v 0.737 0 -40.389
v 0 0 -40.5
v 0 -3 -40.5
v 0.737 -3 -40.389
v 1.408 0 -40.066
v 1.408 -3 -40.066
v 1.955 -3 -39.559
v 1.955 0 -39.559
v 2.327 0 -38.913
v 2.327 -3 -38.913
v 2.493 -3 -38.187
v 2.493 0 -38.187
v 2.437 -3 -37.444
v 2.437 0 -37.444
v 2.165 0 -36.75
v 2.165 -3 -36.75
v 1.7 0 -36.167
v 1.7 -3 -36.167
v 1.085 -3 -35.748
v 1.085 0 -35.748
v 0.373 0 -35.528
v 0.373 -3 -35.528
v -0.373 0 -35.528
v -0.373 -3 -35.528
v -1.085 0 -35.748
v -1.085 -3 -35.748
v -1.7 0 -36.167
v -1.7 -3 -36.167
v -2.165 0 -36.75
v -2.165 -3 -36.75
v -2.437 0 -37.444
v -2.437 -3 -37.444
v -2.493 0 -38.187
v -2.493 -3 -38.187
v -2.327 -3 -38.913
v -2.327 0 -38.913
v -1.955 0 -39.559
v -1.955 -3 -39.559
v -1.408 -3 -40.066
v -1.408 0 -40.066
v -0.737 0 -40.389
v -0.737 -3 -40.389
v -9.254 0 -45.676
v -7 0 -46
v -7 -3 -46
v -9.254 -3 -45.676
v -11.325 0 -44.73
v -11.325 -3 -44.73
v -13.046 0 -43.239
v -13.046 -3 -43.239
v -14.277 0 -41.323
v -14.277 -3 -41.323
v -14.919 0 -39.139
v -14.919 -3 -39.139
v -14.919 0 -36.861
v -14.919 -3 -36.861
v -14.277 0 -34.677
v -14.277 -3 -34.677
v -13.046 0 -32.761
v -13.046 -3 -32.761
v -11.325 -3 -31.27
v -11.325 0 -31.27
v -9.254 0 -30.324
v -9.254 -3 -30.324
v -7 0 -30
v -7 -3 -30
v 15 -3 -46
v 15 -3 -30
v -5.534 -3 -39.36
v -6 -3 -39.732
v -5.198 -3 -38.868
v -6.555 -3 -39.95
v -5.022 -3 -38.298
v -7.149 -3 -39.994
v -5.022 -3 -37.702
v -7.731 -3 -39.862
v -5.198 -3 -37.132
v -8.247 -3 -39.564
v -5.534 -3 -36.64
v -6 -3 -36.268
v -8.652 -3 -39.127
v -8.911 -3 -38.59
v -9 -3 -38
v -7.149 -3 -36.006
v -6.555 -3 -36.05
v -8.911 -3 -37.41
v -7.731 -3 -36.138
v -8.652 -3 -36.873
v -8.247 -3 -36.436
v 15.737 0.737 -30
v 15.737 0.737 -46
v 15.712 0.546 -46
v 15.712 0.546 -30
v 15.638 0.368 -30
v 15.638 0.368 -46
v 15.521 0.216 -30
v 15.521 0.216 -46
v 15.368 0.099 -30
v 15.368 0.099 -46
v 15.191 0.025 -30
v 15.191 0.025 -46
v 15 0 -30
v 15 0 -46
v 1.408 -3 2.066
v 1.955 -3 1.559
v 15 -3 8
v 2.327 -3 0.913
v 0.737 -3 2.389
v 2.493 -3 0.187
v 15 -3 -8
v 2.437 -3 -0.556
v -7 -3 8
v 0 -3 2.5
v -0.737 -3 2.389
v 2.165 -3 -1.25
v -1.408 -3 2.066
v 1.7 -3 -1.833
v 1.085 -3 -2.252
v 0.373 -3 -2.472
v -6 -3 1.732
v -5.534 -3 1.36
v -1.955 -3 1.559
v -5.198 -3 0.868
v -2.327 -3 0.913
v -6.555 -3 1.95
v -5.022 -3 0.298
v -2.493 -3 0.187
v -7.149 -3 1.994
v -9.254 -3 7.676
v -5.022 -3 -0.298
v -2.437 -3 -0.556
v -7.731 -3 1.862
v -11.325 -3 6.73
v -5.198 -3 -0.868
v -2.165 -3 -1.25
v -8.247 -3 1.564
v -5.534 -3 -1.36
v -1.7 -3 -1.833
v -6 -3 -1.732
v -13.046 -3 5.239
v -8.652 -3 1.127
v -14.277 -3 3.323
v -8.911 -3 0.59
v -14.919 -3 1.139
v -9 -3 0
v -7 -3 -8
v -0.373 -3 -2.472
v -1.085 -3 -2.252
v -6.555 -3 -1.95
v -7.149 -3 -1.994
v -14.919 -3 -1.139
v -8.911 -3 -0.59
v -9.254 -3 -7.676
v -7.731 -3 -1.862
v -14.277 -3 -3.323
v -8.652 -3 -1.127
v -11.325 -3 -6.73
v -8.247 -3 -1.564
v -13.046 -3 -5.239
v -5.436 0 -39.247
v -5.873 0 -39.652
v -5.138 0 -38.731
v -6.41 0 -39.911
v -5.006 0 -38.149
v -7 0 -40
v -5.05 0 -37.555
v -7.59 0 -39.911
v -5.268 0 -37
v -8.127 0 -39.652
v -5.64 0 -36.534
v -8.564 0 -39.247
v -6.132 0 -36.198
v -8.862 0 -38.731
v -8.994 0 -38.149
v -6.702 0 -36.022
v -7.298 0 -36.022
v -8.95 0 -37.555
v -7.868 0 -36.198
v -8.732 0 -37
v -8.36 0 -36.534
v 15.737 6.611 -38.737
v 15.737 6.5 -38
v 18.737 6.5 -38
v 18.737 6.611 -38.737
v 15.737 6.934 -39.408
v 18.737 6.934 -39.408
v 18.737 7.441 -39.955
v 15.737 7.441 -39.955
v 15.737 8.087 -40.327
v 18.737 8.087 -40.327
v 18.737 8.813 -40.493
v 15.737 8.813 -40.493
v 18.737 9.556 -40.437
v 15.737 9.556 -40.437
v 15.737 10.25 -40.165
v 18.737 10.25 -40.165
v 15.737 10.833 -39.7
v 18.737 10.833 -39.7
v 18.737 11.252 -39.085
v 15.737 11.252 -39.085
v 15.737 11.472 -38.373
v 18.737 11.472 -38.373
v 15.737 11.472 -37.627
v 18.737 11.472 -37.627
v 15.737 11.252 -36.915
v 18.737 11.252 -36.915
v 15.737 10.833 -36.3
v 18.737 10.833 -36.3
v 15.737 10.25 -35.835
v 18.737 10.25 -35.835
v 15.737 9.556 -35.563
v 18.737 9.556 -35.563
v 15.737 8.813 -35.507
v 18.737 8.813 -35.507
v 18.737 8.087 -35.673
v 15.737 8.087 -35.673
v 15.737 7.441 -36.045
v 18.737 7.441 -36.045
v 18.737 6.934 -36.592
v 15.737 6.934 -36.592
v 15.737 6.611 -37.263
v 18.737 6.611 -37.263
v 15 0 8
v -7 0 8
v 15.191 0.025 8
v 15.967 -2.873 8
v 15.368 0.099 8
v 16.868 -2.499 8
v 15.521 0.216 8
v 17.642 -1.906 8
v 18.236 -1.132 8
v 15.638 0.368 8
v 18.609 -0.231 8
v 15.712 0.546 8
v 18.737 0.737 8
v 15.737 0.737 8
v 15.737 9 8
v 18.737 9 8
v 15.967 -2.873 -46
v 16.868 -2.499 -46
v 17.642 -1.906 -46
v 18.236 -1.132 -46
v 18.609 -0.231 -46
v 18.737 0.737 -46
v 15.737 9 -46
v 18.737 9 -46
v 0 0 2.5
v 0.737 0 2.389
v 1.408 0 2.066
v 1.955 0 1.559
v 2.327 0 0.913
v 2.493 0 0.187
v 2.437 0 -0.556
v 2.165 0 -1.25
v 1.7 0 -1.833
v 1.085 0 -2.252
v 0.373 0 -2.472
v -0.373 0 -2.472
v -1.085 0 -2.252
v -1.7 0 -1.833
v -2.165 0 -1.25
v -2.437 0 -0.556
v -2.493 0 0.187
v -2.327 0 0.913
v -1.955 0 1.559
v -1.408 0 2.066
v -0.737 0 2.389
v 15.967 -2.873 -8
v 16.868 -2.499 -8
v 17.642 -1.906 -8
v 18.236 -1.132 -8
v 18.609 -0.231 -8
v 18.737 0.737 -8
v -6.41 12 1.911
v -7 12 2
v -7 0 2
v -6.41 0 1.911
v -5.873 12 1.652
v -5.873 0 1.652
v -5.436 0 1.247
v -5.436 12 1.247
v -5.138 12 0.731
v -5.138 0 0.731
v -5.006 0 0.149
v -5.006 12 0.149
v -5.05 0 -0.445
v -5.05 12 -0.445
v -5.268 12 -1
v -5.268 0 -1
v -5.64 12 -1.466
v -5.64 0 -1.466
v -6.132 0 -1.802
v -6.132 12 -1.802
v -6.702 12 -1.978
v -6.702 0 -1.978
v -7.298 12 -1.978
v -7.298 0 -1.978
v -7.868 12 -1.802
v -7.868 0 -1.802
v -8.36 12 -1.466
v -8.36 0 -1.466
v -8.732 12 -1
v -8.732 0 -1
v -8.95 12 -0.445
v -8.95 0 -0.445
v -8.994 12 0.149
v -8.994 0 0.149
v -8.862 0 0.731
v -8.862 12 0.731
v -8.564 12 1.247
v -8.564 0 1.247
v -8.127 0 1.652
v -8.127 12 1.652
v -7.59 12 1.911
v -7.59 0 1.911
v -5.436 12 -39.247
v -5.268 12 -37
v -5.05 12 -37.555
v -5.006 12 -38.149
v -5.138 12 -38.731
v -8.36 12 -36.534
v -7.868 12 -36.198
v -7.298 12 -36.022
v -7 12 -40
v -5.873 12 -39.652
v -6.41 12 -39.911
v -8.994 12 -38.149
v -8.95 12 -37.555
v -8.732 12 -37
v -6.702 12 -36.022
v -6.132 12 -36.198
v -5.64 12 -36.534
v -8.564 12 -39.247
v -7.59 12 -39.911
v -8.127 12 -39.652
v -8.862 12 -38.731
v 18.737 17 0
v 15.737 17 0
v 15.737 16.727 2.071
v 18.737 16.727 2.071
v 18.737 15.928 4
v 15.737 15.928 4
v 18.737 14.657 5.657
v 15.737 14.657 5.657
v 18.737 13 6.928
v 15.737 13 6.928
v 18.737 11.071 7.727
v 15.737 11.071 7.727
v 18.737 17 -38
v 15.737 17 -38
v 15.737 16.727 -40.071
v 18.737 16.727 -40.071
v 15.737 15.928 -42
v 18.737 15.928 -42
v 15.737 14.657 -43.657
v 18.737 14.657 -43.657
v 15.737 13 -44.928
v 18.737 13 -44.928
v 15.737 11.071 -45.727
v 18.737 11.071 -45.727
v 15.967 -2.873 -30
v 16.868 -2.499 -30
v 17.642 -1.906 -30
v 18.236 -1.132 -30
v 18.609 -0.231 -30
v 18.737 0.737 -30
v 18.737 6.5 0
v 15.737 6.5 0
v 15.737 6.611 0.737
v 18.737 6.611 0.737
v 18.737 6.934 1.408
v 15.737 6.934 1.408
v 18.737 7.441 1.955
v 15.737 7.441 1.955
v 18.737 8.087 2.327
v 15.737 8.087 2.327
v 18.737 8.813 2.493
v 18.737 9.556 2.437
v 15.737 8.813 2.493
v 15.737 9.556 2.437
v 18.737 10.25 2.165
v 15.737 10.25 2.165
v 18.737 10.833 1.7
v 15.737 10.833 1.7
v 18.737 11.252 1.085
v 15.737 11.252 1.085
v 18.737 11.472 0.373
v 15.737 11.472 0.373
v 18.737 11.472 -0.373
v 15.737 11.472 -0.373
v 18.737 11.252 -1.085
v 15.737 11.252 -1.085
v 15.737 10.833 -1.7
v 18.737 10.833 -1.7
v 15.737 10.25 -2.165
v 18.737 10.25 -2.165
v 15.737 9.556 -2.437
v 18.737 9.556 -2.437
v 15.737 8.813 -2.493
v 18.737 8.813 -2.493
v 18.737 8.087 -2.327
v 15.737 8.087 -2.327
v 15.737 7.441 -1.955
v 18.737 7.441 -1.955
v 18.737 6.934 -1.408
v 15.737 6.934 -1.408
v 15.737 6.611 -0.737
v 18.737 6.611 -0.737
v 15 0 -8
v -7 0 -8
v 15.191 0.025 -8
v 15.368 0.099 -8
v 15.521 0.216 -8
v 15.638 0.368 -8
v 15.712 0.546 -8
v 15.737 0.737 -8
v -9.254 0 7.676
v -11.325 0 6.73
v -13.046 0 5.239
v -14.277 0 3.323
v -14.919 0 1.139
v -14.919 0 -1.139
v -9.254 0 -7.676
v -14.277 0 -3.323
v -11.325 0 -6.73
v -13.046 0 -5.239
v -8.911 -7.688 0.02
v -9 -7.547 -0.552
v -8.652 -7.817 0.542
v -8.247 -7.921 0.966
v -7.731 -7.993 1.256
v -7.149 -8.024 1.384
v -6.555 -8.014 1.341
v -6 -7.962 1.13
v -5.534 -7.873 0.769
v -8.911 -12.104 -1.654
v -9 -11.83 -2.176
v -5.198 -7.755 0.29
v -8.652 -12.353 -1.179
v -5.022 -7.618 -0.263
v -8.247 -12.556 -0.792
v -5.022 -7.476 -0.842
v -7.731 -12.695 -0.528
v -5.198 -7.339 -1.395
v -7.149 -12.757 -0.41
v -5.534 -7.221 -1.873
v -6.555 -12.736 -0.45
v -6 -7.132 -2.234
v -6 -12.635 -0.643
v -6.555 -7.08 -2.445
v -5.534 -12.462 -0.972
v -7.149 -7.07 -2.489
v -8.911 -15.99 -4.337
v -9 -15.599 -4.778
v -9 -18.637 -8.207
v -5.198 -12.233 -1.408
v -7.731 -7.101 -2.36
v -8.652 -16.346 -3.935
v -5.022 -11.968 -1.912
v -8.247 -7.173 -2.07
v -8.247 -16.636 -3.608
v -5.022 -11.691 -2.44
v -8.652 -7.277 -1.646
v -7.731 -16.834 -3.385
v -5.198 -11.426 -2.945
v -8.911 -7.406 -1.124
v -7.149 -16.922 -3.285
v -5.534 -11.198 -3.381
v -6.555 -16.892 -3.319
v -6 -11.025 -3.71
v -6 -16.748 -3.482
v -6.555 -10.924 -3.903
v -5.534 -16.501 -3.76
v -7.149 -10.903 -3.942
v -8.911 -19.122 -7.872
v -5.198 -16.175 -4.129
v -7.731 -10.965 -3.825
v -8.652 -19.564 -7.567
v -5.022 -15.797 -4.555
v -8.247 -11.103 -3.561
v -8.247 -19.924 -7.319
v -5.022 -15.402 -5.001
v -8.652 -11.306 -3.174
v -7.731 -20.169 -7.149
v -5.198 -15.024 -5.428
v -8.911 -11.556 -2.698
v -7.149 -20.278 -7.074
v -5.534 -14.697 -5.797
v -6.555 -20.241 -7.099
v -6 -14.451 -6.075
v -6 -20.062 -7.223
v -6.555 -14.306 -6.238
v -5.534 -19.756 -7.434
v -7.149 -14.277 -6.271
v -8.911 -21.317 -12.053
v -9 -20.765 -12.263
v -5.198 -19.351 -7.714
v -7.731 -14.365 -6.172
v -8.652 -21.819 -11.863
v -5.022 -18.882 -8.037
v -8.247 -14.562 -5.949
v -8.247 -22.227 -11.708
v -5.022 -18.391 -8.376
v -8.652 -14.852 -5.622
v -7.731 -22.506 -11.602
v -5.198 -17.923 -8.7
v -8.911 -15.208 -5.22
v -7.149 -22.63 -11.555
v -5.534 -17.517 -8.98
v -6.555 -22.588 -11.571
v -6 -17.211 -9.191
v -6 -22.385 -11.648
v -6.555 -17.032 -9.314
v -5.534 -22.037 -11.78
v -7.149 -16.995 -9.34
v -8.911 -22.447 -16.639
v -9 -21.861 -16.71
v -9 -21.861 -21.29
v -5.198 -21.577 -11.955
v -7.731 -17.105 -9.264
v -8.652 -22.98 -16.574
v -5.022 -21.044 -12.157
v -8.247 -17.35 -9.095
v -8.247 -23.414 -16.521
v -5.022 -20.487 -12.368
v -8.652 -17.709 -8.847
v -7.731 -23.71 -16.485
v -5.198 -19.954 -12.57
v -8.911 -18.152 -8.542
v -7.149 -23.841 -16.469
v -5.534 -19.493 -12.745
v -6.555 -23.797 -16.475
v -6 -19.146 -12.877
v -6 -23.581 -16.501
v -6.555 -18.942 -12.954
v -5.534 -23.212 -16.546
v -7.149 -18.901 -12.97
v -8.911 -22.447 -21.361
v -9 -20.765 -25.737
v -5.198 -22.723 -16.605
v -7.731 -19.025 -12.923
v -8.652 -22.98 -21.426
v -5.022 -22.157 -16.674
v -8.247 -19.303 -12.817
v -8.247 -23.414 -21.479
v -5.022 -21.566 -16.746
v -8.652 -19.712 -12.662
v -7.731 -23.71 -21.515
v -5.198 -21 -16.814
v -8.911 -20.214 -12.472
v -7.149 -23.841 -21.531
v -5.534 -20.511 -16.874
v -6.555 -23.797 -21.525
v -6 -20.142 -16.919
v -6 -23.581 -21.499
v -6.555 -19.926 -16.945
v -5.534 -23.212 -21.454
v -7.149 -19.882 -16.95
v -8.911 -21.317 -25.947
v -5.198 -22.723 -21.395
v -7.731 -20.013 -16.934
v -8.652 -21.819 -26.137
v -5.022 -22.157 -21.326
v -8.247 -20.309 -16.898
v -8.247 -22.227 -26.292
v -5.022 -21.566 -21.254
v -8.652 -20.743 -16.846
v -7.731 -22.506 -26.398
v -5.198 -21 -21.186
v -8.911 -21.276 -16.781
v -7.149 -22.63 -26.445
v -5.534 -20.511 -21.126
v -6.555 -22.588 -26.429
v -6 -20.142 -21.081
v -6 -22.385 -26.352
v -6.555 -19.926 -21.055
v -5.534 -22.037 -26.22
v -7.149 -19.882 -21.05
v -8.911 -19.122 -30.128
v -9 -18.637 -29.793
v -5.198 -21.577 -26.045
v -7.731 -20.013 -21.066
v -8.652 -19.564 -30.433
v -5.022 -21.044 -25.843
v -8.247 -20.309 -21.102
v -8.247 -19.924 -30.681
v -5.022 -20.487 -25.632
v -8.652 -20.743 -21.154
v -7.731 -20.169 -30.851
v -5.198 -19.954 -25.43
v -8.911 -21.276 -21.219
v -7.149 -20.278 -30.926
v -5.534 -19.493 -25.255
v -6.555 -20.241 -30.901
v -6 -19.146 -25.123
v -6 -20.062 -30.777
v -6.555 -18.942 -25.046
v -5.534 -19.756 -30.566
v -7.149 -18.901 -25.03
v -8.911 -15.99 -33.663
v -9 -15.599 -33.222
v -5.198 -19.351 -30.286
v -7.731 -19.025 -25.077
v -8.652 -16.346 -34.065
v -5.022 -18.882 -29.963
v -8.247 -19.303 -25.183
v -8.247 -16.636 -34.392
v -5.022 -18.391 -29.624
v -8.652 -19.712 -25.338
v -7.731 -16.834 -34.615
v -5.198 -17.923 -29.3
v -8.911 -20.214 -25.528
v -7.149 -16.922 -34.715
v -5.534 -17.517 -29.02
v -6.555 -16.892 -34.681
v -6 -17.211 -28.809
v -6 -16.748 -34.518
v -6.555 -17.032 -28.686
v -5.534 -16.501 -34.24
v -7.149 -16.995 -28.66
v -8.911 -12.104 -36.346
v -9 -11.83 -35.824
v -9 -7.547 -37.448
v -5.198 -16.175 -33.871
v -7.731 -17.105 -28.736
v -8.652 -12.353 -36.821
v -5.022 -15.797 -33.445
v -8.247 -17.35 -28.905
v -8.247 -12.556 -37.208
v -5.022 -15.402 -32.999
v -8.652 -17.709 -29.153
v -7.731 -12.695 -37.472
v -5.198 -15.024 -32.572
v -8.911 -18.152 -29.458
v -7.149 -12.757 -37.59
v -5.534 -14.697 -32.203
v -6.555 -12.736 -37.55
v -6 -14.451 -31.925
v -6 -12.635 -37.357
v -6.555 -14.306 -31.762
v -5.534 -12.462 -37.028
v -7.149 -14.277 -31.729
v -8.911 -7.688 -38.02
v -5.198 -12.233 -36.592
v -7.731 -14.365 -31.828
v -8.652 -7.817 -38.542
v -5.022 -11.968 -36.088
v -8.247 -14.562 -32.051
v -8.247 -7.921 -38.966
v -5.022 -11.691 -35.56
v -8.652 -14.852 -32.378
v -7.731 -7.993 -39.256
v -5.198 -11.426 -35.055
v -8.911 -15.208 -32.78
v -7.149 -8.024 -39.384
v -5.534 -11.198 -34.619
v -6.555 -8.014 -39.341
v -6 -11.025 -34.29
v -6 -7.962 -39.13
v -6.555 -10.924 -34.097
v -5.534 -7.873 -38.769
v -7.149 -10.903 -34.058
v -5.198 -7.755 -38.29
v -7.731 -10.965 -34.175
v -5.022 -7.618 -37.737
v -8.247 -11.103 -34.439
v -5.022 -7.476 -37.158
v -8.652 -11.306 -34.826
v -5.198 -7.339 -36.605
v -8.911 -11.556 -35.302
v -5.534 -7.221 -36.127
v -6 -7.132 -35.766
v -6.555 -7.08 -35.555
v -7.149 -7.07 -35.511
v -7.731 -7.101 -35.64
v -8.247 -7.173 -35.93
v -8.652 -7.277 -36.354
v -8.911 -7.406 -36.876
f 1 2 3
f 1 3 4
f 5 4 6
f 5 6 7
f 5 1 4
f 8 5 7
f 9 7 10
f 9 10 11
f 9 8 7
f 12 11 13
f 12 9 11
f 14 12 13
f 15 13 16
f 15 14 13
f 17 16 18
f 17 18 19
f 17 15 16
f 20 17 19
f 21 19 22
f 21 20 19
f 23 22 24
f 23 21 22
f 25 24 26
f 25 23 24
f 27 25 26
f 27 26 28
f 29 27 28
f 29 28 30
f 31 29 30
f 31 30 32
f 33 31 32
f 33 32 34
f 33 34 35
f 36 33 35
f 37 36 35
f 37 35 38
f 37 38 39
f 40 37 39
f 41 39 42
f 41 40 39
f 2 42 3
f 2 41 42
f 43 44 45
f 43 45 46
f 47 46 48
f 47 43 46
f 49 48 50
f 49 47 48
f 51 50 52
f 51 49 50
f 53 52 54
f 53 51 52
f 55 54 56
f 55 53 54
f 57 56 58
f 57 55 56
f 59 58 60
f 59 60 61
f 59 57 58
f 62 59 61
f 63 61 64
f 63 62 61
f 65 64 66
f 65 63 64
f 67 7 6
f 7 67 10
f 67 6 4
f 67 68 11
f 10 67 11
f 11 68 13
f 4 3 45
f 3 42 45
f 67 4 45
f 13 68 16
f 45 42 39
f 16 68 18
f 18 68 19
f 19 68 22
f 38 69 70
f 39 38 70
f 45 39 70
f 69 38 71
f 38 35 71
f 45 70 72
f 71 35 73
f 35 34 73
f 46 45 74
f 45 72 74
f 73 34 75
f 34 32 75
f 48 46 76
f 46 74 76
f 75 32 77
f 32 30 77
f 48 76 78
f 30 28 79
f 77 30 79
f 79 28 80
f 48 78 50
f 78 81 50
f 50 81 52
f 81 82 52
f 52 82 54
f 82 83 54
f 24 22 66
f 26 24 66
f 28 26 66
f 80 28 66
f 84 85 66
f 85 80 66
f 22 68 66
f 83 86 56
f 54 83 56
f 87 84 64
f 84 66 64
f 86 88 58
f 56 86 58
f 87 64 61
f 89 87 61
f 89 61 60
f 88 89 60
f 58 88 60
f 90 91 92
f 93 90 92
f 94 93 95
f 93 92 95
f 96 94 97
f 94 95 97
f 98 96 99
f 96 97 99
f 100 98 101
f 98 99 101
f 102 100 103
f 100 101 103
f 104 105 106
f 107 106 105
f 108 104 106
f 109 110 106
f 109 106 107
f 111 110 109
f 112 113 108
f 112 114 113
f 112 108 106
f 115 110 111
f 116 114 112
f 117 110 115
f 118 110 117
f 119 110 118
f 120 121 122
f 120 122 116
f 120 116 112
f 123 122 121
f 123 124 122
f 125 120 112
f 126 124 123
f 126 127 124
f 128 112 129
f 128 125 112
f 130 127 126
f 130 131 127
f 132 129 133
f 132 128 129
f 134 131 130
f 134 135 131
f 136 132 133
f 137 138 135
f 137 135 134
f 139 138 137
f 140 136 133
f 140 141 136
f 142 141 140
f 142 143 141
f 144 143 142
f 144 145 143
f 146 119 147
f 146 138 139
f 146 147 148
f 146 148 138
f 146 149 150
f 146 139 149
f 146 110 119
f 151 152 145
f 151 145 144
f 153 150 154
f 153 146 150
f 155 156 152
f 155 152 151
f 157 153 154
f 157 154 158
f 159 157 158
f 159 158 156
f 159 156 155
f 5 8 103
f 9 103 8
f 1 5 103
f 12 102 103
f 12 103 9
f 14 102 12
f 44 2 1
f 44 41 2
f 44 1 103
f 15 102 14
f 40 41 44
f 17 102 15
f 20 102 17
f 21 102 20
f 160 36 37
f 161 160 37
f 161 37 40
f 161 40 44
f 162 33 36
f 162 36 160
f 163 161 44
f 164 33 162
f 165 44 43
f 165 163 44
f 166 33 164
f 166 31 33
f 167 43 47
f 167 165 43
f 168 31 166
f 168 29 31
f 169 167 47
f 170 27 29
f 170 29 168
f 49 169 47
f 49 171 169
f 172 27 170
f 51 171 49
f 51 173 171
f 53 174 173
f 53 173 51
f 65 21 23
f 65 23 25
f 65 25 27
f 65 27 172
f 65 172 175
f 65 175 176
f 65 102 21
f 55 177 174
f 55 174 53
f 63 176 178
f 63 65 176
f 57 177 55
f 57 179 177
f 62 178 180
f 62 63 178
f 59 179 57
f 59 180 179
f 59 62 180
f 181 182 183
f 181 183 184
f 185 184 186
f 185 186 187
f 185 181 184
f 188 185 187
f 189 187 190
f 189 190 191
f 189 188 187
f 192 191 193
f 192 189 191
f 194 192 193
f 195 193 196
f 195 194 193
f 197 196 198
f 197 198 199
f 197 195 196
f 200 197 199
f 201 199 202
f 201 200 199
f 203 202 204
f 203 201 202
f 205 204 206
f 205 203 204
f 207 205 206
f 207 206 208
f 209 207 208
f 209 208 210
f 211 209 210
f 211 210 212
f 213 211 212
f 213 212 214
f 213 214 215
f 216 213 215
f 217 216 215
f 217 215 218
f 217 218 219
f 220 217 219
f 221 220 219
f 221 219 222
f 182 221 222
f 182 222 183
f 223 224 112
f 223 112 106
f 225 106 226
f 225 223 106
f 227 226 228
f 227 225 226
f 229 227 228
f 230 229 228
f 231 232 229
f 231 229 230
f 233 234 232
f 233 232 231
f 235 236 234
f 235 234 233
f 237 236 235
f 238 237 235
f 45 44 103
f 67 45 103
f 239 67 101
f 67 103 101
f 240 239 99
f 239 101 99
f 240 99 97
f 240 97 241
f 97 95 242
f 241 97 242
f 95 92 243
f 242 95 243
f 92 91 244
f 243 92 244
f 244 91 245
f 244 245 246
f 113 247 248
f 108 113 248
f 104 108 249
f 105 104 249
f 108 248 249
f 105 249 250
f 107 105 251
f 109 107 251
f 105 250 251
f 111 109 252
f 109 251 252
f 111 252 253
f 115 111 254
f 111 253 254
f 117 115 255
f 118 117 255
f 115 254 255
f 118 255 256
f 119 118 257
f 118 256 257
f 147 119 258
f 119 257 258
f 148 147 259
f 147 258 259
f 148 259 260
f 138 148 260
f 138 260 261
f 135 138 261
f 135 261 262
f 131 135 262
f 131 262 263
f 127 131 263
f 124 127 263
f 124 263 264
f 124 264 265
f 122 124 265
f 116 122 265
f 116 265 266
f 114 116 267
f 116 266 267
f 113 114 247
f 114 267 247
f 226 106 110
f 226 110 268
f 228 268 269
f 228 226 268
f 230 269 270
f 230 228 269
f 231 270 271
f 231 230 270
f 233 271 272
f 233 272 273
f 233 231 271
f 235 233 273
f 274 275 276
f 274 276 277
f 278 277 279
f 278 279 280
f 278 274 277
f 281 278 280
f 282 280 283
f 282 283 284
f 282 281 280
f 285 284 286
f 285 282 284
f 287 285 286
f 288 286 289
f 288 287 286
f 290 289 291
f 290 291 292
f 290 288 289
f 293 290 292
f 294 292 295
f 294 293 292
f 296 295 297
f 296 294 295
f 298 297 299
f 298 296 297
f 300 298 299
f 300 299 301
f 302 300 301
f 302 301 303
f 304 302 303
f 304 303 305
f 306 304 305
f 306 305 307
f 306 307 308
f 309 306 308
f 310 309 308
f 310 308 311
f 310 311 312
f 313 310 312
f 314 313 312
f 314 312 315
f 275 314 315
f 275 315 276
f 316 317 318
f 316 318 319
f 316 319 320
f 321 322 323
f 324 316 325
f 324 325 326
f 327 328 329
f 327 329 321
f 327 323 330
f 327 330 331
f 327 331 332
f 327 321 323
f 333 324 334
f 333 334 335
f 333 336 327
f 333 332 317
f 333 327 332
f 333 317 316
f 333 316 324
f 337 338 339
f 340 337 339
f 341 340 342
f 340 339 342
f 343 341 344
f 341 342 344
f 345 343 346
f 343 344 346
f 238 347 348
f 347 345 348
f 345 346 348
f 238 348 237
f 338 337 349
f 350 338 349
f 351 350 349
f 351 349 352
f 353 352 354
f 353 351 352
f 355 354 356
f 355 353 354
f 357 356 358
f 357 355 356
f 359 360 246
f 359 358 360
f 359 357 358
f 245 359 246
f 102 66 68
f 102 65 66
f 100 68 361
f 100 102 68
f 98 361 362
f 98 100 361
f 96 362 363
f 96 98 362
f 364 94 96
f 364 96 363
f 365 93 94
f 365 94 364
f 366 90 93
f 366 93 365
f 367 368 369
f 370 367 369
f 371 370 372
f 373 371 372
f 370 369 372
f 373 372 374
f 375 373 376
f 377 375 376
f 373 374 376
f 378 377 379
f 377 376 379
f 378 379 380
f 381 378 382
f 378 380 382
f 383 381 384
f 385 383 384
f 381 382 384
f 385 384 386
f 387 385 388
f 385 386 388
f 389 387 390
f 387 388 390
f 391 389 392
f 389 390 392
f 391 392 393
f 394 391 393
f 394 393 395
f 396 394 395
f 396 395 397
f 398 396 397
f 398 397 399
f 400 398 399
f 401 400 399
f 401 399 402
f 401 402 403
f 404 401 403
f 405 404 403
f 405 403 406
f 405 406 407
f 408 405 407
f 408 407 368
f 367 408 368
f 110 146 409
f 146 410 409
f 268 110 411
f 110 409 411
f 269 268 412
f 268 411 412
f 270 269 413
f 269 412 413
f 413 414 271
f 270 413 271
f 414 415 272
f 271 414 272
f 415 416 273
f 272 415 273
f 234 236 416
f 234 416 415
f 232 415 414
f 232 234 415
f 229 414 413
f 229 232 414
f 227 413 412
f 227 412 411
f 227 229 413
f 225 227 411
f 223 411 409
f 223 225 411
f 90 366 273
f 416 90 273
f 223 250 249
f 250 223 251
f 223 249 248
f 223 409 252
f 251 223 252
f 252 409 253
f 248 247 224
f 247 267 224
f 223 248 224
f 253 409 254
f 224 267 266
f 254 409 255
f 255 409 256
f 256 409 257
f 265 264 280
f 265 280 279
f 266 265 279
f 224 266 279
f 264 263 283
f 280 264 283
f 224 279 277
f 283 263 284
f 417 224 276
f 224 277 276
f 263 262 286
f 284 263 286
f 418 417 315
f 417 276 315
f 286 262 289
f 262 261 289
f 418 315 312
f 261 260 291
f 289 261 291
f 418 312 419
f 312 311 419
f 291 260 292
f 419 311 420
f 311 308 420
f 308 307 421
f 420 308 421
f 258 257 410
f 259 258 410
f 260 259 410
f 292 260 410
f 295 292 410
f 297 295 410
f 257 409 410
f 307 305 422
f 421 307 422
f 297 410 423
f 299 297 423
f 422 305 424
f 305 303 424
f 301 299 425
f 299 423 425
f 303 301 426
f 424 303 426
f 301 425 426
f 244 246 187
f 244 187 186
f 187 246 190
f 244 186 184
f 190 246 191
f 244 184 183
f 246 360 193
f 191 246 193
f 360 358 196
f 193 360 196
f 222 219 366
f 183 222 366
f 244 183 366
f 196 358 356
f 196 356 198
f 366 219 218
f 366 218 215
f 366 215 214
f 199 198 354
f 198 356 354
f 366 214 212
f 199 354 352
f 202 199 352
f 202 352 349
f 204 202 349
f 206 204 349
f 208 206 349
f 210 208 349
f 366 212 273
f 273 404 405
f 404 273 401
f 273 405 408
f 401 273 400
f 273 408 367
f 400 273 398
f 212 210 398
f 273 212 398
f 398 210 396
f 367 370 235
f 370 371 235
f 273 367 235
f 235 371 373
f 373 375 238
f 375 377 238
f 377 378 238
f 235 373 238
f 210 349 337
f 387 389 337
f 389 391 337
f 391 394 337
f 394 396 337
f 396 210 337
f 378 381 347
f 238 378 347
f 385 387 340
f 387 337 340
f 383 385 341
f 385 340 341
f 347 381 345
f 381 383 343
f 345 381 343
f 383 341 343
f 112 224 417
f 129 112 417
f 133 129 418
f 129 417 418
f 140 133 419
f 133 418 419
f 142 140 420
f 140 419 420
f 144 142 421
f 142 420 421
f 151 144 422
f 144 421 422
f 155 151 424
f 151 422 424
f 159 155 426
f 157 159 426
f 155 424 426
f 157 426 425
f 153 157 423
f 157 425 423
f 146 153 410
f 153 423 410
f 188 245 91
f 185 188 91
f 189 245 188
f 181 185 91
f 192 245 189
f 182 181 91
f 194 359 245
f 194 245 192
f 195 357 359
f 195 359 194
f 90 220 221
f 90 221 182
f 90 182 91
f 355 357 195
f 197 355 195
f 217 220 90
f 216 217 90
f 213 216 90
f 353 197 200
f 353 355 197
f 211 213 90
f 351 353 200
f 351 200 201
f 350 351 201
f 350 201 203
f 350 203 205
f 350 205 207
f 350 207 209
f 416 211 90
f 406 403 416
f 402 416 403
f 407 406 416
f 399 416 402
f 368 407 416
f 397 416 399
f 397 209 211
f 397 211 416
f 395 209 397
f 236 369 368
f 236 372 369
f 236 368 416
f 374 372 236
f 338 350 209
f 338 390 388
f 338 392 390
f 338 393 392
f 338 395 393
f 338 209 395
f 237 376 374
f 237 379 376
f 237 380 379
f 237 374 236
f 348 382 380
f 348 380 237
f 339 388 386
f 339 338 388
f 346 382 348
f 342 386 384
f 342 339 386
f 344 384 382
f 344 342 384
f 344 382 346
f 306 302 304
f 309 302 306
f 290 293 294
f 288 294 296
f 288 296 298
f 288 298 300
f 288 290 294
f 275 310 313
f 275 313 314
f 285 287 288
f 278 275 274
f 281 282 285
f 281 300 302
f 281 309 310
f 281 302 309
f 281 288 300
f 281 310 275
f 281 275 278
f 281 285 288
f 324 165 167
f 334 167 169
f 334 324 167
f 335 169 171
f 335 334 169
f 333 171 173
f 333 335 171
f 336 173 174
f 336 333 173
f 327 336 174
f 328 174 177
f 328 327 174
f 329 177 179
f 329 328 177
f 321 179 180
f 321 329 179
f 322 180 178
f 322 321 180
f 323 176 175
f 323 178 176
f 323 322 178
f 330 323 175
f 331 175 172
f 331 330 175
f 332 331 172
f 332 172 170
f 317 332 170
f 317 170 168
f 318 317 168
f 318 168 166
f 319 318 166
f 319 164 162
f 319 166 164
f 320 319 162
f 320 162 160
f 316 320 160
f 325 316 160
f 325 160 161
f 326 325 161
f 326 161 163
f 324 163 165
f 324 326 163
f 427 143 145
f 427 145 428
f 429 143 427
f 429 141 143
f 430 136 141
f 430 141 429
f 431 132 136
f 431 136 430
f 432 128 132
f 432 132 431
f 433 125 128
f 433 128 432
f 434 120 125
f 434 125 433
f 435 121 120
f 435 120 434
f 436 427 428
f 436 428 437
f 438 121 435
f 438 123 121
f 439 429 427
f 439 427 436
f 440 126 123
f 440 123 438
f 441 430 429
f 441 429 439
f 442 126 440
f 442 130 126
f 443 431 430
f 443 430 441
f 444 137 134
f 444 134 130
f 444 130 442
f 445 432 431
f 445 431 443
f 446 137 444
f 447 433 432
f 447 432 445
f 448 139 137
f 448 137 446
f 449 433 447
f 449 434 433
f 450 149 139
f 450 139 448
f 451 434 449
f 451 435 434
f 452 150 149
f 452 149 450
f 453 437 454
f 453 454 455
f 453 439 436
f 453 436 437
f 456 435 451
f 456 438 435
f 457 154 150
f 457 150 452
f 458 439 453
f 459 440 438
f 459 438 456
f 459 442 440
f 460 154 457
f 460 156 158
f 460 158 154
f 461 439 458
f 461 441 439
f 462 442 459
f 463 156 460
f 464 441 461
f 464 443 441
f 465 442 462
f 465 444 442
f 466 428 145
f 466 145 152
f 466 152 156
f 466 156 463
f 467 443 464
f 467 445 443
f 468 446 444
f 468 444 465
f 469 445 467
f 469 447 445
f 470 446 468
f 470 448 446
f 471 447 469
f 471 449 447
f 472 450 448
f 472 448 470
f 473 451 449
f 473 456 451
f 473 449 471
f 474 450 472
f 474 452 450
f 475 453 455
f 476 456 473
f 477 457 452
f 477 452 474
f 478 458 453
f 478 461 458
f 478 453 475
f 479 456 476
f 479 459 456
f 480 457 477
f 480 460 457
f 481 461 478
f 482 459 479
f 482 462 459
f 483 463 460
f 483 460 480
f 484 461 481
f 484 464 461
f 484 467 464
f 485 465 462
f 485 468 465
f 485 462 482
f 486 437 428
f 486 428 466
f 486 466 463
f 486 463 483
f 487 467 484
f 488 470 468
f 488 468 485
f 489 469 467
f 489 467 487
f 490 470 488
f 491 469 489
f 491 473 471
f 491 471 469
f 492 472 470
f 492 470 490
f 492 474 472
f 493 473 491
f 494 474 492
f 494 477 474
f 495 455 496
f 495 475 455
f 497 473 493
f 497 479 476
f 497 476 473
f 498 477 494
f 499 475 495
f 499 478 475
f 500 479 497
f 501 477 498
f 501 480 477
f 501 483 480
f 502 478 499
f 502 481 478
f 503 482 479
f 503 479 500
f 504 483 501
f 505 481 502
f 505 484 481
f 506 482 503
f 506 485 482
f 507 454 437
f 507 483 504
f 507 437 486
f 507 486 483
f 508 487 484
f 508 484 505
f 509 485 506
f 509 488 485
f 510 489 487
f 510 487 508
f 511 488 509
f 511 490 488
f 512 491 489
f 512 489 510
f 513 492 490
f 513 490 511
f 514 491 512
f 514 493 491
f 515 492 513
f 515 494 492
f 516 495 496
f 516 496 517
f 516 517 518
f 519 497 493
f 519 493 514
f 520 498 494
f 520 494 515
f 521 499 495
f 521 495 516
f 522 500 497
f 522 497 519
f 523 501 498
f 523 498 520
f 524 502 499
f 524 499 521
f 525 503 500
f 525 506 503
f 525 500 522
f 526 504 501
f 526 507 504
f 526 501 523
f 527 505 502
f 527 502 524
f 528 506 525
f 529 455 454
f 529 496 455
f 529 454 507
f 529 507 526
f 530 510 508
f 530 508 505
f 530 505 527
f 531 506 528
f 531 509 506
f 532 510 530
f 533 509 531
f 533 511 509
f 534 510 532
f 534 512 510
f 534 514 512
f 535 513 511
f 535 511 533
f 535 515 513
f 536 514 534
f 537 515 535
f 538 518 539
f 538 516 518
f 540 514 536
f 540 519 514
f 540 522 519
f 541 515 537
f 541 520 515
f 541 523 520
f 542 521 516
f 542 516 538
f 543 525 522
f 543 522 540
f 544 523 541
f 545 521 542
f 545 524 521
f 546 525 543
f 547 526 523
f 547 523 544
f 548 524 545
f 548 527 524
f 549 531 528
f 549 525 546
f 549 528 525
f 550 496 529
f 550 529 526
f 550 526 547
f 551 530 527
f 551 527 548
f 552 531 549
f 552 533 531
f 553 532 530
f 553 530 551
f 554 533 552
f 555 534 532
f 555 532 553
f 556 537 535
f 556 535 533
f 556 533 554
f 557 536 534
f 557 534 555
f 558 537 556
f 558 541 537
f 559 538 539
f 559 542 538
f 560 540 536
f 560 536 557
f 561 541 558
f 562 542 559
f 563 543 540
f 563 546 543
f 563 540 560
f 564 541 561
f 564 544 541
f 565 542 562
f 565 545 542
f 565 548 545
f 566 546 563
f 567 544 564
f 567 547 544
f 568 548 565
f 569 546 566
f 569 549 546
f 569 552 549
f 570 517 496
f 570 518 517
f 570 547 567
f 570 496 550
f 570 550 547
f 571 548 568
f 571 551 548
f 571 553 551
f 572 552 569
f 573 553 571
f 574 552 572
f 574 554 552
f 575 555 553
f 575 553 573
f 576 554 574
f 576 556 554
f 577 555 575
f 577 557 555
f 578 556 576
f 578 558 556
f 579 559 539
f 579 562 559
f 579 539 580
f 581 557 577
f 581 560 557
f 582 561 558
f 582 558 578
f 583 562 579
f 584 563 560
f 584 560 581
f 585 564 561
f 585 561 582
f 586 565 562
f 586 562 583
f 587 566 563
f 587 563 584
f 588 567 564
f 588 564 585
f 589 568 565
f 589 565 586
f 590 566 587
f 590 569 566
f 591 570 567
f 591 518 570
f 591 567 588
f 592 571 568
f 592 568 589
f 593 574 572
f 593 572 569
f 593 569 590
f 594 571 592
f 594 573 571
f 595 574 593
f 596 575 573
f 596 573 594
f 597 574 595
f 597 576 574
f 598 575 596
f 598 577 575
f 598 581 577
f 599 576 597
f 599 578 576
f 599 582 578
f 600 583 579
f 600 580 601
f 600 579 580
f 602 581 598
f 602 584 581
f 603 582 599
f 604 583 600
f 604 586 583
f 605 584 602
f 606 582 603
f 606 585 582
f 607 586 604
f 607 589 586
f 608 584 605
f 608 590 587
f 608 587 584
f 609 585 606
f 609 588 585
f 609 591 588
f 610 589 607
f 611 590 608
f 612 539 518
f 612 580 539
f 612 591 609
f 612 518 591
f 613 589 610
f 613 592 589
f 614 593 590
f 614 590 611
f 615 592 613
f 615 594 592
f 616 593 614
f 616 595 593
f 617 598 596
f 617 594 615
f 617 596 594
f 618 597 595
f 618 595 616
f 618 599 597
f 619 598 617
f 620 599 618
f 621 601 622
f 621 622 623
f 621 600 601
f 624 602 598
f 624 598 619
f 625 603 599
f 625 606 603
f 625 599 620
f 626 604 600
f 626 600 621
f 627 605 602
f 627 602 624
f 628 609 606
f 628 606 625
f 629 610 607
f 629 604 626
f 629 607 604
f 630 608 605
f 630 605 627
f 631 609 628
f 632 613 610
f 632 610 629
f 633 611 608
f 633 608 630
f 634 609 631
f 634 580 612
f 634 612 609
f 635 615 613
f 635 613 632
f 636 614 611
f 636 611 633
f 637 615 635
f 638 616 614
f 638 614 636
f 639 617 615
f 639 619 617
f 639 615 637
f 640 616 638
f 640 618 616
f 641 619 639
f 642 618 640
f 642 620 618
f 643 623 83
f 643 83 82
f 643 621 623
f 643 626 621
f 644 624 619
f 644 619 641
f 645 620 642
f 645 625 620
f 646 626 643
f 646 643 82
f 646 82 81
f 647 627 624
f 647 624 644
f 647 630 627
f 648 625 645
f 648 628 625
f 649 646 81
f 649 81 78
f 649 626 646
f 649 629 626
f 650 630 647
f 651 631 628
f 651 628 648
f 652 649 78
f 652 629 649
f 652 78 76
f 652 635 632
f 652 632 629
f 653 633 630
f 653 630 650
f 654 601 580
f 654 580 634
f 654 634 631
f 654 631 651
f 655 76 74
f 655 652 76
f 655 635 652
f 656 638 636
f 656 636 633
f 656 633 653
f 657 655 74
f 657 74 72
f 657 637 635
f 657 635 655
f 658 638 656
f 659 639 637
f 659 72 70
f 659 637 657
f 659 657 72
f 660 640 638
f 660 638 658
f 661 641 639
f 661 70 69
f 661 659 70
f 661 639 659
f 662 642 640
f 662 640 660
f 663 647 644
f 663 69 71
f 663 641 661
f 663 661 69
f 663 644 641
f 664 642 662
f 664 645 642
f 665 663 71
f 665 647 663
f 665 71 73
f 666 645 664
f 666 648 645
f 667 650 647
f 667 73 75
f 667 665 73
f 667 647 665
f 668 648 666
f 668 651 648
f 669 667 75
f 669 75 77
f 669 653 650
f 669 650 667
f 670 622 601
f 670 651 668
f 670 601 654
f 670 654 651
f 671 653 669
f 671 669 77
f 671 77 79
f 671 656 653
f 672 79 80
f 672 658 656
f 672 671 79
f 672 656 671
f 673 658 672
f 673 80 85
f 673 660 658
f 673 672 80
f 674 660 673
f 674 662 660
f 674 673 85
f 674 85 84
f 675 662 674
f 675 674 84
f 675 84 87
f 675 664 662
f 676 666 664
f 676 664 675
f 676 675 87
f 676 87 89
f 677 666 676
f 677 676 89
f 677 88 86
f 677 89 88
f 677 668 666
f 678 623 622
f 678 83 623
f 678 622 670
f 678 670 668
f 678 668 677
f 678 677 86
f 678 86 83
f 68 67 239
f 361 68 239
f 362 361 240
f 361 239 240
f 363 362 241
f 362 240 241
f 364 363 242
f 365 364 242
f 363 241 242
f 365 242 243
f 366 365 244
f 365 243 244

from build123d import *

# Parameters (mm, degrees)
SKETCH1_R           = 2.5
SKETCH1_R_2         = 2
BASE_FLANGE1_DEPTH  = 3
EDGE_FLANGE1_DEPTH  = 16
SKETCH10_R          = 2.5
CUT_EXTRUDE1_DEPTH  = 10
TAB1_START          = -3
TAB1_DEPTH          = 3
SWEEP1_PROFILE_R    = 2
BOSS_EXTRUDE1_START = 15
SKETCH35_R          = 2
BOSS_EXTRUDE1_DEPTH = 15


# Read off the part's stored shape, not the designer's step: Tab1
# Sheet-metal steps are written as plain solids
with BuildPart() as part:
    # Sketch1 → Base-Flange1 (new body)
    with BuildSketch(Plane(origin=(0, 0, 0), x_dir=(1, 0, 0), z_dir=(0, 1, 0))):
        with BuildLine():
            Line((0, -8), (-7, -8))
            ThreePointArc((-7, -8), (-15, 0), (-7, 8))
            Line((-7, 8), (0, 8))
            Line((0, 8), (15, 8))
            Line((15, 8), (15, -8))
            Line((15, -8), (0, -8))
        make_face()
        with Locations(Location((0, 0, 0), (0, 0, 270))):
            Circle(SKETCH1_R, mode=Mode.SUBTRACT)
        with Locations(Location((-7, 0, 0), (0, 0, 270))):
            Circle(SKETCH1_R_2, mode=Mode.SUBTRACT)
    extrude(amount=-BASE_FLANGE1_DEPTH)

    # Edge-Flange1 section (across the edge) → Edge-Flange1 (add)
    with BuildSketch(Plane(origin=(15.7366, 0, 8), x_dir=(-1, 0, 0), z_dir=(0, 0, -1))):
        with BuildLine():
            Line((-3, 0.7366), (-3, 17))
            Line((-3, 17), (0, 17))
            Line((0, 17), (0, 0.7366))
            ThreePointArc((0, 0.7366), (0.215745145, 0.215745145), (0.7366, 0))
            Line((0.7366, 0), (0.7366, -3))
            ThreePointArc((0.7366, -3), (-1.905575199, -1.905575199), (-3, 0.7366))
        make_face()
    extrude(amount=EDGE_FLANGE1_DEPTH)

    # Sketch10 → Cut-Extrude1 (cut)
    with BuildSketch(Plane.ZY.offset(-15.7366)):
        with BuildLine():
            Line((-8, 17), (-8, 9))
            ThreePointArc((-8, 9), (-5.656854249, 14.656854249), (0, 17))
            Line((0, 17), (-8, 17))
        make_face()
        with BuildLine():
            Line((8, 17), (0, 17))
            ThreePointArc((0, 17), (5.656854249, 14.656854249), (8, 9))
            Line((8, 9), (8, 17))
        make_face()
        with Locations(Location((0, 9, 0), (0, 0, 270))):
            Circle(SKETCH10_R)
    extrude(amount=-CUT_EXTRUDE1_DEPTH, mode=Mode.SUBTRACT)


with BuildPart() as body_2:
    # Mirror1: mirrored copy
    add(part.part.mirror(Plane.XY.offset(-19)))


with BuildPart() as part_1:
    add(part.part)

    add(body_2.part)  # Tab1 merges body 2
    # Tab1 outline → Tab1 (add)
    with BuildSketch(Plane.ZY.offset(-15.7366).offset(TAB1_START)):
        with BuildLine():
            ThreePointArc((-8, 9), (-5.656854249, 14.656854249), (0, 17))
            Line((0, 17), (-38, 17))
            ThreePointArc((-38, 17), (-32.343145751, 14.656854249), (-30, 9))
            Line((-30, 9), (-30, 0.7366))
            Line((-30, 0.7366), (-8, 0.7366))
            Line((-8, 0.7366), (-8, 9))
        make_face()
    extrude(amount=TAB1_DEPTH)



with BuildPart() as body_2_2:
    # Sweep1: sweep along a path in Sketch15
    with BuildLine(Plane.ZY.offset(7)) as sweep1_path:
        ThreePointArc((0, -3), (-19, -22), (-38, -3))
    # Sweep1 profile (on start of the path) → Sweep1 (sweep)
    with BuildSketch(Plane(origin=(-7, -3, 0), x_dir=(-1, 0, 0), z_dir=(0, -1, 0))):
        Circle(SWEEP1_PROFILE_R)
    sweep(path=sweep1_path.line)


with BuildPart() as part_2:
    add(part_1.part)

    add(body_2_2.part)  # Boss-Extrude1 merges body 2 2
    # Sketch35 → Boss-Extrude1 (add)
    with BuildSketch(Plane(origin=(0, -3, 0), x_dir=(1, 0, 0), z_dir=(0, 1, 0)).offset(BOSS_EXTRUDE1_START)):
        with Locations(Location((-7, 38, 0), (0, 0, 90))):
            Circle(SKETCH35_R)
        with Locations(Location((-7, 0, 0), (0, 0, 270))):
            Circle(SKETCH35_R)
    extrude(amount=-BOSS_EXTRUDE1_DEPTH)


solid = part_2.part
